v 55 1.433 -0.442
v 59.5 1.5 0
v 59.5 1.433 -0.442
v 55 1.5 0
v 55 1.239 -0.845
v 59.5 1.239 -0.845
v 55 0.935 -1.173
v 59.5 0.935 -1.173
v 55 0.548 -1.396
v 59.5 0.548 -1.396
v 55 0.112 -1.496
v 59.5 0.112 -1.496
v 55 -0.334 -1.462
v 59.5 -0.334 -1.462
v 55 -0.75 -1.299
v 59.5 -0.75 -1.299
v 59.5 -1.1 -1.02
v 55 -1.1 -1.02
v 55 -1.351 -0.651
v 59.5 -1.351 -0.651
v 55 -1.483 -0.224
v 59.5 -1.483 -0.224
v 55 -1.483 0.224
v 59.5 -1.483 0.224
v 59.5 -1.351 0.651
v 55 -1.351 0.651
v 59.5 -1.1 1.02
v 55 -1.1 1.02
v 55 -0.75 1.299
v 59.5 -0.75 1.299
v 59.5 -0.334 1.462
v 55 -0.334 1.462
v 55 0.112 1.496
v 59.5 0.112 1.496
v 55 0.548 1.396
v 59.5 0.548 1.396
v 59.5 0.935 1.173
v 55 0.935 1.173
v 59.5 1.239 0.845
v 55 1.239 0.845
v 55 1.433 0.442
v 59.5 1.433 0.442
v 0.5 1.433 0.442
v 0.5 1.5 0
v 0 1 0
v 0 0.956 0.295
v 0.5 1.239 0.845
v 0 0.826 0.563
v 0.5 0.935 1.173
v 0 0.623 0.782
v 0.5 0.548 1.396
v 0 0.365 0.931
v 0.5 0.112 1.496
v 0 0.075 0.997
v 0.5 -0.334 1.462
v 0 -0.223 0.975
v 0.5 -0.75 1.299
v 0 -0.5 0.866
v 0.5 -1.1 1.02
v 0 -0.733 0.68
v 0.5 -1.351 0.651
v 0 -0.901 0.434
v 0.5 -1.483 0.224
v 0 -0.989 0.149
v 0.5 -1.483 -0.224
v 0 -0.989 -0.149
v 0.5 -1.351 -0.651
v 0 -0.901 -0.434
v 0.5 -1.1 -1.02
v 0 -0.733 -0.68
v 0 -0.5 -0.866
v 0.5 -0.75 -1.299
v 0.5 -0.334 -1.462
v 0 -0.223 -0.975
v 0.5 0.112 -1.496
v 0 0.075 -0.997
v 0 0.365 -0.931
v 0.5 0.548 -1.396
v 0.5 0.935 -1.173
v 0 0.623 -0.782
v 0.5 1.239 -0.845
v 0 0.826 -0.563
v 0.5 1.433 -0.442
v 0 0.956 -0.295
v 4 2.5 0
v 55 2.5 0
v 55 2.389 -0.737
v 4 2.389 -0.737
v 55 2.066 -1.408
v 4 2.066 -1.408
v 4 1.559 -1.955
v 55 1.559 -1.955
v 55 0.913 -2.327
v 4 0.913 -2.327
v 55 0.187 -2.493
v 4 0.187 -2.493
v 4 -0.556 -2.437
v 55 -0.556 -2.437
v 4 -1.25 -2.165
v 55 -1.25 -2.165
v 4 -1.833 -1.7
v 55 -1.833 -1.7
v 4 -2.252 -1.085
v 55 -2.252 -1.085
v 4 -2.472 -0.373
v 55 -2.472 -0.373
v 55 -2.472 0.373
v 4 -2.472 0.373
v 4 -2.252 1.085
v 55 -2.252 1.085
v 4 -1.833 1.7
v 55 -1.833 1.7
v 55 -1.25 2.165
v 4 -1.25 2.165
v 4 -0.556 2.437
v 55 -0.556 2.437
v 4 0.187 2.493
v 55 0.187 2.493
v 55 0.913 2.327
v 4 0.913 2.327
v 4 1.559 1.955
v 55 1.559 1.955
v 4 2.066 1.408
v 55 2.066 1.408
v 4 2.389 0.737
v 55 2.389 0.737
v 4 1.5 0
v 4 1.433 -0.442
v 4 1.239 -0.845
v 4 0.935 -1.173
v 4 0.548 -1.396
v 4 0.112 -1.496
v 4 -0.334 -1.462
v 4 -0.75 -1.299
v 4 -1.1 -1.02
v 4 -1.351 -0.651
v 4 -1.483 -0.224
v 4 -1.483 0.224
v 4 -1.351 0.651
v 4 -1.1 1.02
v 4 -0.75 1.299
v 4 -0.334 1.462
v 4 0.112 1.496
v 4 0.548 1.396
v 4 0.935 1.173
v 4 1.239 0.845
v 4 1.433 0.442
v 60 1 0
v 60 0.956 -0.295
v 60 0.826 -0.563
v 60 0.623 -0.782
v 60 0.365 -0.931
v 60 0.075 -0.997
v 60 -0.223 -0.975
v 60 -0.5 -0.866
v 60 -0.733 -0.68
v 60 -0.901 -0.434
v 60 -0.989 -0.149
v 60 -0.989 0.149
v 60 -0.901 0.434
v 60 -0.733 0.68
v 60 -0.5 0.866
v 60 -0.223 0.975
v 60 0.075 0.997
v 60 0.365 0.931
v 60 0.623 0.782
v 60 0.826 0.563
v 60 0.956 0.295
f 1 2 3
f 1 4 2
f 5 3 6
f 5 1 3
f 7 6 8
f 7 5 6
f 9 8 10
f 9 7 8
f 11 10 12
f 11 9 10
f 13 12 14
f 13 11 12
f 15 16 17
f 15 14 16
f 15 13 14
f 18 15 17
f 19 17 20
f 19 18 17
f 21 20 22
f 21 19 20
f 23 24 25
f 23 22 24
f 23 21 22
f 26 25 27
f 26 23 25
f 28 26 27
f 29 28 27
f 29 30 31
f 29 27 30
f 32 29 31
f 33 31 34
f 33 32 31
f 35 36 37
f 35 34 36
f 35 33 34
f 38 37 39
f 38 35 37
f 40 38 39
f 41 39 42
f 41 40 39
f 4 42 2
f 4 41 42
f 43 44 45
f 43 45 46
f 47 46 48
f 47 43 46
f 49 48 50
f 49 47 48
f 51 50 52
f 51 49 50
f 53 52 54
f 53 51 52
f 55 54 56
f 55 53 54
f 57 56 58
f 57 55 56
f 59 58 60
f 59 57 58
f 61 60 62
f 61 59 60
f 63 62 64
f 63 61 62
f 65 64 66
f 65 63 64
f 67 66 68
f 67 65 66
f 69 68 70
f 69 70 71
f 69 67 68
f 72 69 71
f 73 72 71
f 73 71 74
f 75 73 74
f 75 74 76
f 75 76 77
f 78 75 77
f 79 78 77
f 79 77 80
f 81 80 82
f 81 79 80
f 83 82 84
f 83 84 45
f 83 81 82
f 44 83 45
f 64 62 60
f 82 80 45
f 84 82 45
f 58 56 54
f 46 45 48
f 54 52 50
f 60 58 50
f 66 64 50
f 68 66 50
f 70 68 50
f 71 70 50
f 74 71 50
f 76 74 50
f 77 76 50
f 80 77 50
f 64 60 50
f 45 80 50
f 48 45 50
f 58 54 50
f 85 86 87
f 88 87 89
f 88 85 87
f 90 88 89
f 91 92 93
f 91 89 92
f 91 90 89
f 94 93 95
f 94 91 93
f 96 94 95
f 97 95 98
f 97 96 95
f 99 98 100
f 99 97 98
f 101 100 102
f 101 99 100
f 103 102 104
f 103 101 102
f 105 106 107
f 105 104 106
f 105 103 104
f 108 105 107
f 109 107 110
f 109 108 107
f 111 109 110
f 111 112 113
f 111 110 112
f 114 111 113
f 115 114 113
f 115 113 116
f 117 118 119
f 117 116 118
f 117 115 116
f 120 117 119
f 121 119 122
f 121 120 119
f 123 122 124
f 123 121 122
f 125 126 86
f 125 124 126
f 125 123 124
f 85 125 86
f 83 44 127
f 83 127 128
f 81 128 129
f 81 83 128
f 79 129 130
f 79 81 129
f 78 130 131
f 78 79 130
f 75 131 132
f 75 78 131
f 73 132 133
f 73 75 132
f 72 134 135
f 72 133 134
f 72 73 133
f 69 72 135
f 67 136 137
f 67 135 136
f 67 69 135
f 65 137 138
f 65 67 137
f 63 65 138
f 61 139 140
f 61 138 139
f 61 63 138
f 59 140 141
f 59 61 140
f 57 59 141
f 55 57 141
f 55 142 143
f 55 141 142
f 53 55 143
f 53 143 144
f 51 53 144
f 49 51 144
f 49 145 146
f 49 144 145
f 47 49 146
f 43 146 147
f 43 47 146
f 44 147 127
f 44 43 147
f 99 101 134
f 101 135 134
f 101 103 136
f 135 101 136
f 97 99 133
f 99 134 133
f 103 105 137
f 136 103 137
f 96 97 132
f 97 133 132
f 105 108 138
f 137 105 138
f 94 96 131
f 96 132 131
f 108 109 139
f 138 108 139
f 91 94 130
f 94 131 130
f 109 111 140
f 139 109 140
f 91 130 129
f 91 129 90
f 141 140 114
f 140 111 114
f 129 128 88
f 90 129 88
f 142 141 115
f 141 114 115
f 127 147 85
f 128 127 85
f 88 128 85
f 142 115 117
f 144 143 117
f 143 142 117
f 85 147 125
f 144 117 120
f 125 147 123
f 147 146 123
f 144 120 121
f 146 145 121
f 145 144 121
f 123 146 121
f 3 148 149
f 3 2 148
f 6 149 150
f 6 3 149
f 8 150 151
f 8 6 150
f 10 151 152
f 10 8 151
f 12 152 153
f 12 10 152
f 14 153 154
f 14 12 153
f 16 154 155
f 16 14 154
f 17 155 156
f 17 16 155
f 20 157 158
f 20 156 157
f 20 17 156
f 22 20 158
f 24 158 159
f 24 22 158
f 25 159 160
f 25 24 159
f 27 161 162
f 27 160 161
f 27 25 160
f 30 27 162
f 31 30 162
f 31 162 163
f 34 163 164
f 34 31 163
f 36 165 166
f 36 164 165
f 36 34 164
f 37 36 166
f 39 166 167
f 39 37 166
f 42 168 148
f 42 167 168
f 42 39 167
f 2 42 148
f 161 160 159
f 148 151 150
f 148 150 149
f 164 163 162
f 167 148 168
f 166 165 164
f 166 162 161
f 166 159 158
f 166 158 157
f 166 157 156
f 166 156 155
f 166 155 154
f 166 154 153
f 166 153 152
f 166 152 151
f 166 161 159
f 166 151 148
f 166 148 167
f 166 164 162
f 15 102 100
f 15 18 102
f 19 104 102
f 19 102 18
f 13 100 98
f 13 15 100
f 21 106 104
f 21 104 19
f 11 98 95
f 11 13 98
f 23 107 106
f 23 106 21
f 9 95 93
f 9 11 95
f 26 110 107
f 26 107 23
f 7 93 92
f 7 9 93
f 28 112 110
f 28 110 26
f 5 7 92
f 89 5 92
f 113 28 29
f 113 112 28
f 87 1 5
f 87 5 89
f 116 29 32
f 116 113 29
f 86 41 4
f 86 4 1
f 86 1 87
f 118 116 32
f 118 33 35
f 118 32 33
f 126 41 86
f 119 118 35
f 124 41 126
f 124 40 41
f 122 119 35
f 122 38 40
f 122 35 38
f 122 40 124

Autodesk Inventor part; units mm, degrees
ref_plane "YZ Plane" through (0, 0, 0) normal (1, 0, 0) x (0, 1, 0)
ref_plane "XZ Plane" through (0, 0, 0) normal (0, 1, 0) x (-1, 0, 0)
ref_plane "XY Plane" through (0, 0, 0) normal (0, 0, 1) x (1, 0, 0)
sketch "Skizze2" plane through (0, 0, 0) normal (0, 0, 1) x (1, 0, 0)
  line L0 (0, -0.5) -> (0, 3) projected
  line L1 (-12, 0) -> (72, 0) projected
  line L2 (0, 0) -> (4, 0)
  line L3 (4, 1.5) -> (0, 1.5)
  line L4 (0, 1.5) -> (0, 0)
  line L5 (4, 0) -> (55, 0)
  line L6 (55, 1.5) -> (55, 2.5)
  line L7 (55, 2.5) -> (4, 2.5)
  line L8 (4, 2.5) -> (4, 1.5)
  line L9 (55, 0) -> (60, 0)
  line L10 (60, 0) -> (60, 1.5)
  line L11 (60, 1.5) -> (55, 1.5)
  dimension "d0" = 3
  dimension "d1" = 5
  dimension "d2" = 4
  dimension "d3" = 5
  dimension "d4" = 60
revolve "Umdrehung1" add sketch "Skizze2" angle 360 about axis through (-10, 0, 0) along (1, 0, 0)
thread "Gewinde1" size "M3x0.5" class "6g" standard "ANSI Metric M Profile" full length
thread "Gewinde2" size "M3x0.5" class "6g" standard "ANSI Metric M Profile" full length
chamfer "Fase1" distance 0.5 angle 45 2 edges at (60, -1.5, 0) (0, -1.5, 0)
properties part number "Kolbenstange"
